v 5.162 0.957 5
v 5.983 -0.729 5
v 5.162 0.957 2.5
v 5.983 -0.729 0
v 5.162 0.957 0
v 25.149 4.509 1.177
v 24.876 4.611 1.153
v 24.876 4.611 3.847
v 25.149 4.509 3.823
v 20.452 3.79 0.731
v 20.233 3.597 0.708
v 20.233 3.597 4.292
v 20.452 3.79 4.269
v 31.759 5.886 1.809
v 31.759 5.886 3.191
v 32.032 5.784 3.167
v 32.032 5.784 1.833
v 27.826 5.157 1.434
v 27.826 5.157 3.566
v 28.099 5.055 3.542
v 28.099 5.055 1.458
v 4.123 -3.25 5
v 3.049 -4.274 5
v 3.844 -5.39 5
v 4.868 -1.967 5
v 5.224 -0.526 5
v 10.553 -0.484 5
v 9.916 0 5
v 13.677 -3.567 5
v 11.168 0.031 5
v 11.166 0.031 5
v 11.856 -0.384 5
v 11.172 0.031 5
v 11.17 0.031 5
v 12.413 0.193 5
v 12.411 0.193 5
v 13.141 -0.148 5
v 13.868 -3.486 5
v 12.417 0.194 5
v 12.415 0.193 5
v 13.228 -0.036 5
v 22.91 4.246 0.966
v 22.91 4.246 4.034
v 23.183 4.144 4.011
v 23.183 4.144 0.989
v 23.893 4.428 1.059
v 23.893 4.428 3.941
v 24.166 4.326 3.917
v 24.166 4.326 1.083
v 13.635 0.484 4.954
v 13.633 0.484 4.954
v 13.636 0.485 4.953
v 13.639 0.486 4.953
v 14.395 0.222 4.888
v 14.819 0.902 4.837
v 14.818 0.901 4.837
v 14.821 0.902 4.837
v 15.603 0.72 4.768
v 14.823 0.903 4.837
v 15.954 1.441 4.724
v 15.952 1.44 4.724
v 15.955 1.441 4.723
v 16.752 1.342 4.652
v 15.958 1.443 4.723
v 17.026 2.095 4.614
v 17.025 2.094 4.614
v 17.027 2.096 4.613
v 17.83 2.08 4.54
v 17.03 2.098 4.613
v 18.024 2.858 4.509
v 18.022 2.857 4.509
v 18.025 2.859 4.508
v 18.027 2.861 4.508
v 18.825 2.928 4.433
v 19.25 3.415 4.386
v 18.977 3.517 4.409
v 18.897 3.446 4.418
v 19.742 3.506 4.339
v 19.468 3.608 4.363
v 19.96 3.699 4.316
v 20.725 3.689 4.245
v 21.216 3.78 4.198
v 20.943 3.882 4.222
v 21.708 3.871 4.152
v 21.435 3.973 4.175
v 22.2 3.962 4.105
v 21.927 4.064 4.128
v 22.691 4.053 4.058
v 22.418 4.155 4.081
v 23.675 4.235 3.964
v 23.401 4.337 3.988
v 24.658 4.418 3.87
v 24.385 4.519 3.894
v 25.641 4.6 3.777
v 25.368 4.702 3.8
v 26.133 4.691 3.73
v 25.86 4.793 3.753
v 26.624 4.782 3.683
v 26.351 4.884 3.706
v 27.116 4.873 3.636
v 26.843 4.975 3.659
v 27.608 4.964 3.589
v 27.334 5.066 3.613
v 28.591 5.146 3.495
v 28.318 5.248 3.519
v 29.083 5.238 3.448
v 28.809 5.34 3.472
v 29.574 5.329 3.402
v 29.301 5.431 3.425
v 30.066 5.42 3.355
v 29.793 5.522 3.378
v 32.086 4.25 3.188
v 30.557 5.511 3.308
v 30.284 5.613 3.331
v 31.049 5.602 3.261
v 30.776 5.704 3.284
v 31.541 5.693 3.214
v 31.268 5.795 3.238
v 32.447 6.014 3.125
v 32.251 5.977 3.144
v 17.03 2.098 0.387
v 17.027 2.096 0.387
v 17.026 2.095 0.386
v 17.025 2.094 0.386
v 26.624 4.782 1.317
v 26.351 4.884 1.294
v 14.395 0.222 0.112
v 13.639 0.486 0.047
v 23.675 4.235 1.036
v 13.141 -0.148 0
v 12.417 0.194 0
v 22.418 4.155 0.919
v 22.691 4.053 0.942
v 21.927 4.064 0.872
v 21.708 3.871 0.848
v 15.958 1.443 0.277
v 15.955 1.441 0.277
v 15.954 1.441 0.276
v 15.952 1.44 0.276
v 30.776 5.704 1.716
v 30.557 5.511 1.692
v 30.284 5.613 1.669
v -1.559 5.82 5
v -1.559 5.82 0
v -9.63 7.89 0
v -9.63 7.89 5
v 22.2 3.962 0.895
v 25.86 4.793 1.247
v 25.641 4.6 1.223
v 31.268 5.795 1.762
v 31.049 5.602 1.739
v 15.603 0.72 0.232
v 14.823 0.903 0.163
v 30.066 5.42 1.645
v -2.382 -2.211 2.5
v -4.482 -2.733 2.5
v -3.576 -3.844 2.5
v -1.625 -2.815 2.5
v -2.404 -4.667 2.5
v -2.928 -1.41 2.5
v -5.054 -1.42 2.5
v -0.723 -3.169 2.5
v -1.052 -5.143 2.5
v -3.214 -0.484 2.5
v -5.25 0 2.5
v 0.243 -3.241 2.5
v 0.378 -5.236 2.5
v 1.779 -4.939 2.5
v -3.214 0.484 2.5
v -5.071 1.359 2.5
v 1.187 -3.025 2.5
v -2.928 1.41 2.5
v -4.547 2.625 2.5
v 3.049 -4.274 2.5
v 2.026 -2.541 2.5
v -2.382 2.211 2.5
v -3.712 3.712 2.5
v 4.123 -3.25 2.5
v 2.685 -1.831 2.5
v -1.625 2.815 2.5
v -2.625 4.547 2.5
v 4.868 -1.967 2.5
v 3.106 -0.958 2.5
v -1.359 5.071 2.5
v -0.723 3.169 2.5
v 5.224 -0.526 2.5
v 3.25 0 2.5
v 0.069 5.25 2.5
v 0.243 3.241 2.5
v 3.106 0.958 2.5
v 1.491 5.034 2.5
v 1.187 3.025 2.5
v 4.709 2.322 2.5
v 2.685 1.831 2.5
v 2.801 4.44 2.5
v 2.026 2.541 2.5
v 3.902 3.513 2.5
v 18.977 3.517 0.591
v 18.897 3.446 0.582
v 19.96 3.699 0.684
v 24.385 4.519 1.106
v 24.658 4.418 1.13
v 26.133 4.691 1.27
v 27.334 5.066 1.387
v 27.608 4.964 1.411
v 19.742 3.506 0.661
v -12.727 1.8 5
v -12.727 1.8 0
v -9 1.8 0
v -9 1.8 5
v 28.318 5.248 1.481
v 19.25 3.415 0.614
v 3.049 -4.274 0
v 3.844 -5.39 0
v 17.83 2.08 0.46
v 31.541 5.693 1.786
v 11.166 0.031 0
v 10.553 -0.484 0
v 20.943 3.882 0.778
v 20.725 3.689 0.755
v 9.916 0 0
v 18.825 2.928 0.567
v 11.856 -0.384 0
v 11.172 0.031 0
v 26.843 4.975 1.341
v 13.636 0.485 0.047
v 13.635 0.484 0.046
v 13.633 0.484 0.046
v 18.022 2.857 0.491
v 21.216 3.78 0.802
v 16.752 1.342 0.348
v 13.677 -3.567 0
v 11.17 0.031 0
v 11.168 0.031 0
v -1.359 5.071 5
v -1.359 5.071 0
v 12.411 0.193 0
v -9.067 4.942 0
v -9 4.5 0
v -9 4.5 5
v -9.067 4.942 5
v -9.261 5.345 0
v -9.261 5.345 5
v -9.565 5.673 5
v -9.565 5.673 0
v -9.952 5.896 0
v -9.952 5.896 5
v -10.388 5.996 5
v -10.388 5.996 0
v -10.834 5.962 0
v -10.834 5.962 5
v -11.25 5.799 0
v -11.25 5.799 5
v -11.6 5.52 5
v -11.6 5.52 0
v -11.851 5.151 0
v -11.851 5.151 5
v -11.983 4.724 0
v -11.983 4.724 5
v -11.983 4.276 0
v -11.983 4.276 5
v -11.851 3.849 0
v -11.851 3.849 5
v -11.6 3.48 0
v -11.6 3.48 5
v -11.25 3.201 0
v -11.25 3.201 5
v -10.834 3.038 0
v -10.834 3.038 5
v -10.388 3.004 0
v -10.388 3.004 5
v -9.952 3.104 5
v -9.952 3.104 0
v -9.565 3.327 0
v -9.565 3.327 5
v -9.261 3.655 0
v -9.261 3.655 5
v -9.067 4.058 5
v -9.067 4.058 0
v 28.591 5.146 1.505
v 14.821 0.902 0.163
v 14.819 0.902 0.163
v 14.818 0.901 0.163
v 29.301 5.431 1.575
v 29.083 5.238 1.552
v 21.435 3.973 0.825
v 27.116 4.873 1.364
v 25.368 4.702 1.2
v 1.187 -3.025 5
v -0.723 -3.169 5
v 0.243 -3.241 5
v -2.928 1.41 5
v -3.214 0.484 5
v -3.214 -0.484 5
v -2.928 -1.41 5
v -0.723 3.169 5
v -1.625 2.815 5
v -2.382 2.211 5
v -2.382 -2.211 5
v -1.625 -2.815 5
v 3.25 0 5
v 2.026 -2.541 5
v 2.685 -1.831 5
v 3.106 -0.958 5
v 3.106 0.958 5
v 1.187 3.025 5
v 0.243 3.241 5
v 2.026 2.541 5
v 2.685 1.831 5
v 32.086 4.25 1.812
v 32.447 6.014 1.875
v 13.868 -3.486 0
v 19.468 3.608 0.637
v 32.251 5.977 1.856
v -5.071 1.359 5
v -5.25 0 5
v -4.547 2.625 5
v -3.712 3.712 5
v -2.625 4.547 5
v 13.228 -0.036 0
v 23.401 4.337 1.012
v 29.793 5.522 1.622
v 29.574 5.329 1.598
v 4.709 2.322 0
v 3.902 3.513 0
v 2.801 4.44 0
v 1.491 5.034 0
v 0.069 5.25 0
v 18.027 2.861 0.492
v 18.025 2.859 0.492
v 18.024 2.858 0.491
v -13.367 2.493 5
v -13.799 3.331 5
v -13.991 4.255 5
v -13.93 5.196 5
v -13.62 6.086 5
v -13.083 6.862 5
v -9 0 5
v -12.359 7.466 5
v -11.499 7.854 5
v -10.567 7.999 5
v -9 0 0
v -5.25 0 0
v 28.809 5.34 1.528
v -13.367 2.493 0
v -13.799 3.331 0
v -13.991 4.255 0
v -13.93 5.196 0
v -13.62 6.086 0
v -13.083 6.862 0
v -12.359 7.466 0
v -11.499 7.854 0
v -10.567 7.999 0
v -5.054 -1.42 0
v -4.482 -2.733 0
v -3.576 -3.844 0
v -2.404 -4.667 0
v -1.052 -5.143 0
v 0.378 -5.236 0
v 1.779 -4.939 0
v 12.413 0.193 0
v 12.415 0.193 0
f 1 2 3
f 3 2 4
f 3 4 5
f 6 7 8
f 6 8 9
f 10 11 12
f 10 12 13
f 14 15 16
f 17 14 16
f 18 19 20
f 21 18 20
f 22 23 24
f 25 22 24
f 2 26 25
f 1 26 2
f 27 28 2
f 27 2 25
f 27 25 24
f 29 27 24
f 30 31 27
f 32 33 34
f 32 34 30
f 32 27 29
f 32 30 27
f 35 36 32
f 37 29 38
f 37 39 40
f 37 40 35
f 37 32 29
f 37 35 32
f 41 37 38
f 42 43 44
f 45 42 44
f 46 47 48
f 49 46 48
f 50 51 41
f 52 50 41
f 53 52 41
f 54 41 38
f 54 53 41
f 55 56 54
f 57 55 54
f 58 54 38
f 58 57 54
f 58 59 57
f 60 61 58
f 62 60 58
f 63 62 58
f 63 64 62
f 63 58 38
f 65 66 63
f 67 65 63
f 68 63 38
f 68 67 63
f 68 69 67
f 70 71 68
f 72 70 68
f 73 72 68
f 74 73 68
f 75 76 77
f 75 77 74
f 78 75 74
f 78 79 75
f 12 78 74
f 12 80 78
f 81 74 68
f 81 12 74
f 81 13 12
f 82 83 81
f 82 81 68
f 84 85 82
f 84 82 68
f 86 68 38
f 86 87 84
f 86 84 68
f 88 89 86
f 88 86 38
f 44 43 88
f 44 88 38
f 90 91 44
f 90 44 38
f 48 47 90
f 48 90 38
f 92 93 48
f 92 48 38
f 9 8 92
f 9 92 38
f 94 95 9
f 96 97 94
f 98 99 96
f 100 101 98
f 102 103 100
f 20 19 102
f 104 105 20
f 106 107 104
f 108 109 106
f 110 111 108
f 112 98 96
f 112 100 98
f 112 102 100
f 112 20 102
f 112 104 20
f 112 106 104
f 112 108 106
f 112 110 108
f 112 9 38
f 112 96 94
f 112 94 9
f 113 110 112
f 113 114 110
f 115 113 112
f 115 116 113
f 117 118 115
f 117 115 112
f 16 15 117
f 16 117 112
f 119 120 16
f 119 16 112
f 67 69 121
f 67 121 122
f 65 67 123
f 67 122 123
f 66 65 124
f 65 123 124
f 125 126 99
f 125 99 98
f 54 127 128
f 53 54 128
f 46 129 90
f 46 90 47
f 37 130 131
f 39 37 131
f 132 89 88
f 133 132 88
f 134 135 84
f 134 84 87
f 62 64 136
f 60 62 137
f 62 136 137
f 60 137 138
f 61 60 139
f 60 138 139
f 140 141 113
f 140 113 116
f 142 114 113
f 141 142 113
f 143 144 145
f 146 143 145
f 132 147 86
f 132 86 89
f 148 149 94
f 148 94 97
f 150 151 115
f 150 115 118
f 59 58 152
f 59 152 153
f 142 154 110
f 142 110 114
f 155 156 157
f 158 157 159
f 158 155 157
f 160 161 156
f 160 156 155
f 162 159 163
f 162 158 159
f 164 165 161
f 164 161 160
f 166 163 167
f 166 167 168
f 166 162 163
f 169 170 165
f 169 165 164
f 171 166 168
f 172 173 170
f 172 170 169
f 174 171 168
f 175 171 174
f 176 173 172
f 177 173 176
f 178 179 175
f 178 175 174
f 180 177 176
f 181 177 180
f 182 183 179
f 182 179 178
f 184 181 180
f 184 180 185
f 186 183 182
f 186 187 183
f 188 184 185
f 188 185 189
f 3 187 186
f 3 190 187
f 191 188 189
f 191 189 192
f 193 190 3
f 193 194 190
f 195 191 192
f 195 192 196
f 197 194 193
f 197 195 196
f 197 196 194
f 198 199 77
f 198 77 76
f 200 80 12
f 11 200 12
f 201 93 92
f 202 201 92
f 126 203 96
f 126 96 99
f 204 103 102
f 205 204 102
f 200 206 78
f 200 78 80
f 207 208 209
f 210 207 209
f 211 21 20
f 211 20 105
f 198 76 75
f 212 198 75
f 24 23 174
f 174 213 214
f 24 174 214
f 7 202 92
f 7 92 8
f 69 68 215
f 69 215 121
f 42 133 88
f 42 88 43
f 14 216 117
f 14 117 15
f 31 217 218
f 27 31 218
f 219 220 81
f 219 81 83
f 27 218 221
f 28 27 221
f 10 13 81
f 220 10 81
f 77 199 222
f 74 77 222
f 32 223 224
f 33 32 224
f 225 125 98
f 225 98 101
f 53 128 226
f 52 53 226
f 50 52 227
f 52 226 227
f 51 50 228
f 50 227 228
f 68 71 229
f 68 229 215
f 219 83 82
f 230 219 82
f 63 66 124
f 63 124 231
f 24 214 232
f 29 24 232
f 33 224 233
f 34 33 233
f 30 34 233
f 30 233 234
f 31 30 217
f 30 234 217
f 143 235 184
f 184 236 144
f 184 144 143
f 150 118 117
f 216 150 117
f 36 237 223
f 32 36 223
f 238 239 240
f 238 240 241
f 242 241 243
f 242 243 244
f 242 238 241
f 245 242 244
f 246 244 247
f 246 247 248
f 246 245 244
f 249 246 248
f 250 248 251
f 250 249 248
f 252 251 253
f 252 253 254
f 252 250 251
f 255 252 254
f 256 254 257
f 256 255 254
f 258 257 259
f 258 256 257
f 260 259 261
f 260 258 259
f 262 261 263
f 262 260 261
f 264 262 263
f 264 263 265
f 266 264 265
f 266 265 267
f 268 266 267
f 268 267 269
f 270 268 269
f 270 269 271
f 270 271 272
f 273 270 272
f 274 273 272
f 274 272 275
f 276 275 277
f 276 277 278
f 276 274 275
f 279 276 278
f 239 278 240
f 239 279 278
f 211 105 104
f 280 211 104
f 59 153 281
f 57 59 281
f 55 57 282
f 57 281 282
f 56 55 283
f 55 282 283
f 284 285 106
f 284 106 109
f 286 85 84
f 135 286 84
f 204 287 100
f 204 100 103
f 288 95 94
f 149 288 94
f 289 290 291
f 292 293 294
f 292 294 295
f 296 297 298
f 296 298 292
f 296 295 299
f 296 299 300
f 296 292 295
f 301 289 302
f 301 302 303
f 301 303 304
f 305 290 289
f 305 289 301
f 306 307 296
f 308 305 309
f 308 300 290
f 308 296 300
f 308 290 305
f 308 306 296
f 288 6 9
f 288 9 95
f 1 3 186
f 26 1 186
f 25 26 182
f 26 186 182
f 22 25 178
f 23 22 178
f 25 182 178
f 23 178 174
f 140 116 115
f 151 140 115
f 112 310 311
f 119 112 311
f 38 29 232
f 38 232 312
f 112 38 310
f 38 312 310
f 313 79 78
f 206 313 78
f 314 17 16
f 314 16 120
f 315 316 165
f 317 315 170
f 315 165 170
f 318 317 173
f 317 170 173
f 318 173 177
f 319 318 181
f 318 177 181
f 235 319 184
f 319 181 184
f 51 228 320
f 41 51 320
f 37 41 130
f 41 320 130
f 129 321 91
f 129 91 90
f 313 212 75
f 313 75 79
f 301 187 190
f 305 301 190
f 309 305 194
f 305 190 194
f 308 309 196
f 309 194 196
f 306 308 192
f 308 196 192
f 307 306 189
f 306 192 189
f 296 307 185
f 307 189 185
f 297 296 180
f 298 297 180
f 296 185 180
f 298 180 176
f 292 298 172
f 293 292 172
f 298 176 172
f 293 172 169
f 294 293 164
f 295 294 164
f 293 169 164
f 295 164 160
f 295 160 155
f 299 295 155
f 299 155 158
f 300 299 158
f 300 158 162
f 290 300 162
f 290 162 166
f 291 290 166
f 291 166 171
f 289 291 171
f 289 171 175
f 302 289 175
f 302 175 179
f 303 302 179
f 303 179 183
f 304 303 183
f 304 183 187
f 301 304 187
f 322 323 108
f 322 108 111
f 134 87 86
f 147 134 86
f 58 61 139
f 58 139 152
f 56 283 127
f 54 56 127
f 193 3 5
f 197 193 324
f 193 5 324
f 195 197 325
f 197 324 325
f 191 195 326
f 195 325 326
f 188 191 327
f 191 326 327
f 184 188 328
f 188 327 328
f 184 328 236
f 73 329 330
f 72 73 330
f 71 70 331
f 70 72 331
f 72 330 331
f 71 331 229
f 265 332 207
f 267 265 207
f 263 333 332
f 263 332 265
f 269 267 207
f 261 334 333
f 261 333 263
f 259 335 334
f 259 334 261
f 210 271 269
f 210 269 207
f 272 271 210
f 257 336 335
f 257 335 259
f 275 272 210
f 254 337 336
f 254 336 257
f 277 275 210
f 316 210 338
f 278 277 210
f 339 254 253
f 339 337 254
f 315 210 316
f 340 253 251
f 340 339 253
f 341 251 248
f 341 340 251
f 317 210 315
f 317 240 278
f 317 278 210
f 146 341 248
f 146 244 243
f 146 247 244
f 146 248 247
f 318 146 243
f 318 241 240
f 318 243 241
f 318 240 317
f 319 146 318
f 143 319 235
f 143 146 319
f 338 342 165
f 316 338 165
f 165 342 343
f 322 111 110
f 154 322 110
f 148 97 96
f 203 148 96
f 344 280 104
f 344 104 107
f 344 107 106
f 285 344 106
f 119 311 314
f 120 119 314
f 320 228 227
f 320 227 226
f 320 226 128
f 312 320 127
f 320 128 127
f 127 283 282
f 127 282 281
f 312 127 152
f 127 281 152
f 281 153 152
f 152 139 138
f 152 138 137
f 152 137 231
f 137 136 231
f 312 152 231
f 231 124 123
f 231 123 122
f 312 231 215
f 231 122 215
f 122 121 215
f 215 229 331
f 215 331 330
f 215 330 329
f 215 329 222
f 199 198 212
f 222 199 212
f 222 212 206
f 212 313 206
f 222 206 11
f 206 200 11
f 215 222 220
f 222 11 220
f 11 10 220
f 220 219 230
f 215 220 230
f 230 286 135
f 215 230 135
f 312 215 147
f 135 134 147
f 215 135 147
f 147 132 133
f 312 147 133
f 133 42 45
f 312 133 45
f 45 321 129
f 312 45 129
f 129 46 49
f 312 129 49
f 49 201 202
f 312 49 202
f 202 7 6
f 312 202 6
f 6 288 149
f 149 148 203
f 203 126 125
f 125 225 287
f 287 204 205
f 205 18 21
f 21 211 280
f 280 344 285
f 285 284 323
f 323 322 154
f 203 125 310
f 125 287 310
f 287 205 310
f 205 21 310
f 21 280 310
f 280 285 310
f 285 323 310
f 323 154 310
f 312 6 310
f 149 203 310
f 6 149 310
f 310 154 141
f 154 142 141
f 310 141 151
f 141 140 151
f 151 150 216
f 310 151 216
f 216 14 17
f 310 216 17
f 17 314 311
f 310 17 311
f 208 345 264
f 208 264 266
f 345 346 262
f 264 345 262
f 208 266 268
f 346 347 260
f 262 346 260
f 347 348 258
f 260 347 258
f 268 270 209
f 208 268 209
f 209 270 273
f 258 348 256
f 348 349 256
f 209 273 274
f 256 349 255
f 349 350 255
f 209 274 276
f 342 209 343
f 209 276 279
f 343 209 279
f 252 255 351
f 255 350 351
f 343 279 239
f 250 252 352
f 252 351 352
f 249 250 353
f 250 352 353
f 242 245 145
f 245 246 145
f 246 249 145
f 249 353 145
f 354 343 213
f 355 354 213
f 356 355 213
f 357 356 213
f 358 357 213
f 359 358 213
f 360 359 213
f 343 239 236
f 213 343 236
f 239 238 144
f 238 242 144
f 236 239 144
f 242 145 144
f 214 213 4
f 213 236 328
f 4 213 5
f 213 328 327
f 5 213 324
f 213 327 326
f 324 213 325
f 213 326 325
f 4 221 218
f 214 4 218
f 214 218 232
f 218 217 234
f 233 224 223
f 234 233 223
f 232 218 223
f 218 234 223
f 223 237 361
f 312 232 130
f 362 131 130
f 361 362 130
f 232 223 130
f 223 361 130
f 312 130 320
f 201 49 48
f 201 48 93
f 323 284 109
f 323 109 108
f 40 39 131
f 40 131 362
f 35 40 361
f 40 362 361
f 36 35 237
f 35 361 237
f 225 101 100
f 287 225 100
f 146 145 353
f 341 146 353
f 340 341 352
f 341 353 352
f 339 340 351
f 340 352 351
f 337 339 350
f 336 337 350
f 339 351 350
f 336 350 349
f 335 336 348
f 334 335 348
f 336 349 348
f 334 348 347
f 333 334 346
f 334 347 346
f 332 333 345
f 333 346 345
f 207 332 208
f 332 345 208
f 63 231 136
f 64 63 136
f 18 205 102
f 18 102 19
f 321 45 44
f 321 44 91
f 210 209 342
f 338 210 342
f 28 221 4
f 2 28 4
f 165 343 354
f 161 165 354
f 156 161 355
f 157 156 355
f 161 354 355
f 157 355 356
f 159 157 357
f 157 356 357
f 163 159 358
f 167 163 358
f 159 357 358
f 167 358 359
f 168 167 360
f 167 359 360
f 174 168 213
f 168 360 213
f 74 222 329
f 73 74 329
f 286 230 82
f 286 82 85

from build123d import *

# Parameters (mm, degrees)
SKETCH1_R             = 1.5
BOSS_EXTRUDE1_DEPTH   = 5
BOSS_EXTRUDE1_2_DEPTH = 5
SKETCH1_3_R           = 5.25
BOSS_EXTRUDE2_DEPTH   = 2.5
SKETCH1_4_R           = 3.25
BOSS_EXTRUDE3_DEPTH   = 5
CUT_EXTRUDE1_DEPTH    = 34.791042337
CUT_EXTRUDE2_DEPTH    = 34.791042337
LPATTERN1_COUNT       = 28
LPATTERN1_PITCH       = 0.5
CUT_EXTRUDE3_DEPTH    = 34.791042337
CIRPATTERN1_COUNT     = 8
CIRPATTERN1_ANGLE     = 42


with BuildPart() as part:
    # Sketch1 → Boss-Extrude1 (new body)
    with BuildSketch(Plane.XY):
        with BuildLine():
            Line((-1.559459186, 5.819980914), (-9.630372069, 7.89024295))
            ThreePointArc((-9.630372069, 7.89024295), (-13.619847961, 6.086363356), (-12.727105745, 1.8))
            Line((-12.727105745, 1.8), (-9, 1.8))
            Line((-9, 1.8), (-9, 0))
            Line((-9, 0), (-5.25, 0))
            ThreePointArc((-5.25, 0), (-4.165105037, 3.195997502), (-1.358799987, 5.071110588))
            Line((-1.358799987, 5.071110588), (-1.559459186, 5.819980914))
        make_face()
        with Locations((-10.5, 4.5)):
            Circle(SKETCH1_R, mode=Mode.SUBTRACT)
    extrude(amount=BOSS_EXTRUDE1_DEPTH)



with BuildPart() as body_2:
    # Sketch1 → Boss-Extrude1 2 (new body)
    with BuildSketch(Plane.XY):
        with BuildLine():
            Line((5.983025461, -0.728942102), (5.162088265, 0.956736509))
            ThreePointArc((5.162088265, 0.956736509), (4.867715236, -1.966684615), (3.048690517, -4.274106471))
            Line((3.048690517, -4.274106471), (3.844408913, -5.389662519))
            Line((3.844408913, -5.389662519), (13.676957988, -3.567307264))
            Line((13.676957988, -3.567307264), (32.08570782, 4.250488438))
            Line((32.08570782, 4.250488438), (32.44741195, 6.013772341))
            Line((32.44741195, 6.013772341), (18.681843244, 3.462474984))
            ThreePointArc((18.681843244, 3.462474984), (14.653100202, 0.834635979), (9.916045092, 0))
            Line((9.916045092, 0), (5.983025461, -0.728942102))
        make_face()
    extrude(amount=BOSS_EXTRUDE1_2_DEPTH)


with BuildPart() as part_1:
    add(part.part)

    add(body_2.part)  # Boss-Extrude2 merges body 2
    # Sketch1<3> → Boss-Extrude2 (add)
    with BuildSketch(Plane.XY):
        Circle(SKETCH1_3_R)
    extrude(amount=BOSS_EXTRUDE2_DEPTH)

    # Sketch1<4> → Boss-Extrude3 (add)
    with BuildSketch(Plane.XY):
        Circle(SKETCH1_4_R)
    extrude(amount=BOSS_EXTRUDE3_DEPTH)

    # Sketch2 → Cut-Extrude1 (cut, through all)
    with BuildSketch(Plane(origin=(0, 0, 0), x_dir=(0.9832549075639557, 0.18223552549214142, 0), z_dir=(-0.18223552549214142, 0.9832549075639557, 0))):
        Polygon((13, 0), (33, -1.875), (33, 0), align=None)
        Polygon((33, -3.125), (33, -5), (13, -5), align=None)
    extrude(amount=-CUT_EXTRUDE1_DEPTH, mode=Mode.SUBTRACT)

    # Sketch3 → Cut-Extrude2 (cut, symmetric)
    with BuildSketch(Plane.XY):
        Polygon((31.759133514, 5.886207473), (32.03228257, 5.784278119), (32.250760968, 5.977325236), align=None)
    cut_extrude2 = extrude(amount=CUT_EXTRUDE2_DEPTH, both=True, mode=Mode.SUBTRACT)

    # LPattern1: Cut-Extrude2 ×28
    with Locations(*[Vector(-0.983254907563956, -0.1822355254921403, 0) * (i * LPATTERN1_PITCH) for i in range(1, LPATTERN1_COUNT)]):
        add(cut_extrude2, mode=Mode.SUBTRACT)

    # Sketch4 → Cut-Extrude3 (cut, through all)
    with BuildSketch(Plane.XY):
        Polygon((9.916045092, 0), (11.165663009, 0.030904073), (10.553215679, -0.48439513), align=None)
    cut_extrude3 = extrude(amount=CUT_EXTRUDE3_DEPTH, mode=Mode.SUBTRACT)

    # CirPattern1: Cut-Extrude3 ×8 about axis
    cirpattern1_axis = Axis((10.244577616, 11.995501923, 0), (0, 0, 1))
    for i in range(1, CIRPATTERN1_COUNT):
        add(cut_extrude3.rotate(cirpattern1_axis, i * CIRPATTERN1_ANGLE / (CIRPATTERN1_COUNT - 1)), mode=Mode.SUBTRACT)


solid = part_1.part
